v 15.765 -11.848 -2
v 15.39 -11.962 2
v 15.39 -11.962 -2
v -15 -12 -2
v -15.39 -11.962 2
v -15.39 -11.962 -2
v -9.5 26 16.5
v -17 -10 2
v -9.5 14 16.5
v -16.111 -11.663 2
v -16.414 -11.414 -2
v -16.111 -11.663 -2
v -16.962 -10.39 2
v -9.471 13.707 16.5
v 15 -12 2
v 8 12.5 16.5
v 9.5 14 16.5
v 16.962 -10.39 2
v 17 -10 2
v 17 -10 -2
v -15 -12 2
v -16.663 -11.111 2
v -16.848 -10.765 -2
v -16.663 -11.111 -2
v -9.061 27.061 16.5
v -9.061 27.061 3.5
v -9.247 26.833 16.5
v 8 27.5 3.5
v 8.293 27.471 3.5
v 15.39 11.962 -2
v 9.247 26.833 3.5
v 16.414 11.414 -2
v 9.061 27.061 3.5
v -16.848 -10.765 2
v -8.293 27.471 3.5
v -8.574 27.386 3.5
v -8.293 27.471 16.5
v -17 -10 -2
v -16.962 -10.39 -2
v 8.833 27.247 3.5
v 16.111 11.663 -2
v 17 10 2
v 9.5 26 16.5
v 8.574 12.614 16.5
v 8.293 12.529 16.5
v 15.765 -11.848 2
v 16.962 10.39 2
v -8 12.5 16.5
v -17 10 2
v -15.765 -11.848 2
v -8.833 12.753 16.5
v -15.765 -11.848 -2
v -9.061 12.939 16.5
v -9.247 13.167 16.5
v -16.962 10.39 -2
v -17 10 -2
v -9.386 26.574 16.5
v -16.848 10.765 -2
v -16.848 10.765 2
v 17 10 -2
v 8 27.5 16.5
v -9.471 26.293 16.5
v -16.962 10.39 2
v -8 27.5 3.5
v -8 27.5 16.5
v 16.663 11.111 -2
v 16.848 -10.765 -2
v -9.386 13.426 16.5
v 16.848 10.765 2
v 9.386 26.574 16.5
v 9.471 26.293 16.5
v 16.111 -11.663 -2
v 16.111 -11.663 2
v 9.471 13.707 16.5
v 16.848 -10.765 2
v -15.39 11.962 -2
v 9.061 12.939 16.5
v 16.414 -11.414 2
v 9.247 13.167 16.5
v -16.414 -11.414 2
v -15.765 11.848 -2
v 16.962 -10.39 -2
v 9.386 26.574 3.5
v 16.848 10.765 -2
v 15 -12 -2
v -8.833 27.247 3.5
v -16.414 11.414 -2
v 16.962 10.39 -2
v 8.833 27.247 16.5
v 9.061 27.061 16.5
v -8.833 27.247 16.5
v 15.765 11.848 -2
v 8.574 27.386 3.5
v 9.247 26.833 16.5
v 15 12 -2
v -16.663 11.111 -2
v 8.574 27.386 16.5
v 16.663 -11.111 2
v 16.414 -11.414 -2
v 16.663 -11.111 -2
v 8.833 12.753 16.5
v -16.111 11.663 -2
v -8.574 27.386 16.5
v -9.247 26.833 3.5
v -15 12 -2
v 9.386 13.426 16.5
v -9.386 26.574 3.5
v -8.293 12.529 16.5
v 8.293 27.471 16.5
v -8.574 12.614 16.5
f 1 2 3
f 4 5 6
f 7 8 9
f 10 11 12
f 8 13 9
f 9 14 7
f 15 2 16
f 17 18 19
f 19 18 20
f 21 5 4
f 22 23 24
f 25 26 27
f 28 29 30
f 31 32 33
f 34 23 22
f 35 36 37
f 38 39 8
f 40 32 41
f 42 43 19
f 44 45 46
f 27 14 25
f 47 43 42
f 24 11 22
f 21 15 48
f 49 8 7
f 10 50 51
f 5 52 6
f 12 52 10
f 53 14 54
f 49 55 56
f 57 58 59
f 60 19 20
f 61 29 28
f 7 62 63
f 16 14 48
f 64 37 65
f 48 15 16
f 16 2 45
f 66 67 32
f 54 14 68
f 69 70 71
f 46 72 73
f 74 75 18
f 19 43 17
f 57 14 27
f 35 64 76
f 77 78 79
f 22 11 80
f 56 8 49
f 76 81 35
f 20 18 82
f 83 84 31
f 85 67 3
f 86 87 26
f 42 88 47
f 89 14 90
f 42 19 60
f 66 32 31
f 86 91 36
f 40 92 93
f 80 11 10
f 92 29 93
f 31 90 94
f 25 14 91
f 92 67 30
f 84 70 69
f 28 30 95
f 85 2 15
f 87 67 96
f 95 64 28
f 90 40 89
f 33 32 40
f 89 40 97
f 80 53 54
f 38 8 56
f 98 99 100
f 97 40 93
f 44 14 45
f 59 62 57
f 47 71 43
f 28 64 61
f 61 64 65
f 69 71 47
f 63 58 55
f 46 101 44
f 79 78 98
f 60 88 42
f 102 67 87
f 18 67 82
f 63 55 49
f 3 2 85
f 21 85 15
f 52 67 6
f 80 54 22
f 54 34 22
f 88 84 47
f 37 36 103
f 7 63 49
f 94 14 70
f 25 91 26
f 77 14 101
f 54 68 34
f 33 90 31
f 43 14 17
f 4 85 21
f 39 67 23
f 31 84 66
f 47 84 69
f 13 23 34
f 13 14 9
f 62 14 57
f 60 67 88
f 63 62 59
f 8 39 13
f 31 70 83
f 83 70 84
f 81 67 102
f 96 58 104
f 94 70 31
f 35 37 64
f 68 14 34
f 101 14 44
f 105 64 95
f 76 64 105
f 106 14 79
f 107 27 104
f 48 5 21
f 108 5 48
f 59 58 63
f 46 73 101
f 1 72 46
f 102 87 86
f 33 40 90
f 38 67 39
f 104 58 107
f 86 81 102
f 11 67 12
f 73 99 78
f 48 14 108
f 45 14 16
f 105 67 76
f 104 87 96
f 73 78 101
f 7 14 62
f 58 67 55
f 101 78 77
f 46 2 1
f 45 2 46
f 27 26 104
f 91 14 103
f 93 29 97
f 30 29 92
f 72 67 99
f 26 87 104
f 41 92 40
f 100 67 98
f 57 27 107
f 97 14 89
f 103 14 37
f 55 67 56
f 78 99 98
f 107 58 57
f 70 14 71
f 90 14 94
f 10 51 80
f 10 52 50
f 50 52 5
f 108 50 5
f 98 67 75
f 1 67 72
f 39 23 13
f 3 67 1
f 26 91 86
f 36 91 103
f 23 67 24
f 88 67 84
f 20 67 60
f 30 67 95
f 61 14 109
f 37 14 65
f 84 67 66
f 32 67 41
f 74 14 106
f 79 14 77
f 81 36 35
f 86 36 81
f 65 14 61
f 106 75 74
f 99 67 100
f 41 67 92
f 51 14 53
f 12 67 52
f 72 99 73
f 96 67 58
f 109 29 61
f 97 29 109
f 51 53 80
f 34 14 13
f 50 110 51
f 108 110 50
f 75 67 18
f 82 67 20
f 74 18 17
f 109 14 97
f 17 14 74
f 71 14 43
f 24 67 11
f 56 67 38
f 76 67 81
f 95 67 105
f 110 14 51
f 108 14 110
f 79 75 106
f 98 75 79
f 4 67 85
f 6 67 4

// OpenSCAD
// =============================================================================
// test_hull_minkowski.scad
//
// Hull between two minkowski-rounded cubes — creates smooth rounded fillets.
// Pattern from: led_array_holder.scad (holder base)
// Expected: a smooth, rounded bridging shape between two rounded cubes.
// =============================================================================

$fn = 32;

hull() {
    minkowski() {
        cube([30, 20, 3], center = true);
        cylinder(r = 2, h = 1, center = true);
    }
    translate([0, 20, 10]) {
        minkowski() {
            cube([16, 12, 12], center = true);
            cylinder(r = 1.5, h = 1, center = true);
        }
    }
}
